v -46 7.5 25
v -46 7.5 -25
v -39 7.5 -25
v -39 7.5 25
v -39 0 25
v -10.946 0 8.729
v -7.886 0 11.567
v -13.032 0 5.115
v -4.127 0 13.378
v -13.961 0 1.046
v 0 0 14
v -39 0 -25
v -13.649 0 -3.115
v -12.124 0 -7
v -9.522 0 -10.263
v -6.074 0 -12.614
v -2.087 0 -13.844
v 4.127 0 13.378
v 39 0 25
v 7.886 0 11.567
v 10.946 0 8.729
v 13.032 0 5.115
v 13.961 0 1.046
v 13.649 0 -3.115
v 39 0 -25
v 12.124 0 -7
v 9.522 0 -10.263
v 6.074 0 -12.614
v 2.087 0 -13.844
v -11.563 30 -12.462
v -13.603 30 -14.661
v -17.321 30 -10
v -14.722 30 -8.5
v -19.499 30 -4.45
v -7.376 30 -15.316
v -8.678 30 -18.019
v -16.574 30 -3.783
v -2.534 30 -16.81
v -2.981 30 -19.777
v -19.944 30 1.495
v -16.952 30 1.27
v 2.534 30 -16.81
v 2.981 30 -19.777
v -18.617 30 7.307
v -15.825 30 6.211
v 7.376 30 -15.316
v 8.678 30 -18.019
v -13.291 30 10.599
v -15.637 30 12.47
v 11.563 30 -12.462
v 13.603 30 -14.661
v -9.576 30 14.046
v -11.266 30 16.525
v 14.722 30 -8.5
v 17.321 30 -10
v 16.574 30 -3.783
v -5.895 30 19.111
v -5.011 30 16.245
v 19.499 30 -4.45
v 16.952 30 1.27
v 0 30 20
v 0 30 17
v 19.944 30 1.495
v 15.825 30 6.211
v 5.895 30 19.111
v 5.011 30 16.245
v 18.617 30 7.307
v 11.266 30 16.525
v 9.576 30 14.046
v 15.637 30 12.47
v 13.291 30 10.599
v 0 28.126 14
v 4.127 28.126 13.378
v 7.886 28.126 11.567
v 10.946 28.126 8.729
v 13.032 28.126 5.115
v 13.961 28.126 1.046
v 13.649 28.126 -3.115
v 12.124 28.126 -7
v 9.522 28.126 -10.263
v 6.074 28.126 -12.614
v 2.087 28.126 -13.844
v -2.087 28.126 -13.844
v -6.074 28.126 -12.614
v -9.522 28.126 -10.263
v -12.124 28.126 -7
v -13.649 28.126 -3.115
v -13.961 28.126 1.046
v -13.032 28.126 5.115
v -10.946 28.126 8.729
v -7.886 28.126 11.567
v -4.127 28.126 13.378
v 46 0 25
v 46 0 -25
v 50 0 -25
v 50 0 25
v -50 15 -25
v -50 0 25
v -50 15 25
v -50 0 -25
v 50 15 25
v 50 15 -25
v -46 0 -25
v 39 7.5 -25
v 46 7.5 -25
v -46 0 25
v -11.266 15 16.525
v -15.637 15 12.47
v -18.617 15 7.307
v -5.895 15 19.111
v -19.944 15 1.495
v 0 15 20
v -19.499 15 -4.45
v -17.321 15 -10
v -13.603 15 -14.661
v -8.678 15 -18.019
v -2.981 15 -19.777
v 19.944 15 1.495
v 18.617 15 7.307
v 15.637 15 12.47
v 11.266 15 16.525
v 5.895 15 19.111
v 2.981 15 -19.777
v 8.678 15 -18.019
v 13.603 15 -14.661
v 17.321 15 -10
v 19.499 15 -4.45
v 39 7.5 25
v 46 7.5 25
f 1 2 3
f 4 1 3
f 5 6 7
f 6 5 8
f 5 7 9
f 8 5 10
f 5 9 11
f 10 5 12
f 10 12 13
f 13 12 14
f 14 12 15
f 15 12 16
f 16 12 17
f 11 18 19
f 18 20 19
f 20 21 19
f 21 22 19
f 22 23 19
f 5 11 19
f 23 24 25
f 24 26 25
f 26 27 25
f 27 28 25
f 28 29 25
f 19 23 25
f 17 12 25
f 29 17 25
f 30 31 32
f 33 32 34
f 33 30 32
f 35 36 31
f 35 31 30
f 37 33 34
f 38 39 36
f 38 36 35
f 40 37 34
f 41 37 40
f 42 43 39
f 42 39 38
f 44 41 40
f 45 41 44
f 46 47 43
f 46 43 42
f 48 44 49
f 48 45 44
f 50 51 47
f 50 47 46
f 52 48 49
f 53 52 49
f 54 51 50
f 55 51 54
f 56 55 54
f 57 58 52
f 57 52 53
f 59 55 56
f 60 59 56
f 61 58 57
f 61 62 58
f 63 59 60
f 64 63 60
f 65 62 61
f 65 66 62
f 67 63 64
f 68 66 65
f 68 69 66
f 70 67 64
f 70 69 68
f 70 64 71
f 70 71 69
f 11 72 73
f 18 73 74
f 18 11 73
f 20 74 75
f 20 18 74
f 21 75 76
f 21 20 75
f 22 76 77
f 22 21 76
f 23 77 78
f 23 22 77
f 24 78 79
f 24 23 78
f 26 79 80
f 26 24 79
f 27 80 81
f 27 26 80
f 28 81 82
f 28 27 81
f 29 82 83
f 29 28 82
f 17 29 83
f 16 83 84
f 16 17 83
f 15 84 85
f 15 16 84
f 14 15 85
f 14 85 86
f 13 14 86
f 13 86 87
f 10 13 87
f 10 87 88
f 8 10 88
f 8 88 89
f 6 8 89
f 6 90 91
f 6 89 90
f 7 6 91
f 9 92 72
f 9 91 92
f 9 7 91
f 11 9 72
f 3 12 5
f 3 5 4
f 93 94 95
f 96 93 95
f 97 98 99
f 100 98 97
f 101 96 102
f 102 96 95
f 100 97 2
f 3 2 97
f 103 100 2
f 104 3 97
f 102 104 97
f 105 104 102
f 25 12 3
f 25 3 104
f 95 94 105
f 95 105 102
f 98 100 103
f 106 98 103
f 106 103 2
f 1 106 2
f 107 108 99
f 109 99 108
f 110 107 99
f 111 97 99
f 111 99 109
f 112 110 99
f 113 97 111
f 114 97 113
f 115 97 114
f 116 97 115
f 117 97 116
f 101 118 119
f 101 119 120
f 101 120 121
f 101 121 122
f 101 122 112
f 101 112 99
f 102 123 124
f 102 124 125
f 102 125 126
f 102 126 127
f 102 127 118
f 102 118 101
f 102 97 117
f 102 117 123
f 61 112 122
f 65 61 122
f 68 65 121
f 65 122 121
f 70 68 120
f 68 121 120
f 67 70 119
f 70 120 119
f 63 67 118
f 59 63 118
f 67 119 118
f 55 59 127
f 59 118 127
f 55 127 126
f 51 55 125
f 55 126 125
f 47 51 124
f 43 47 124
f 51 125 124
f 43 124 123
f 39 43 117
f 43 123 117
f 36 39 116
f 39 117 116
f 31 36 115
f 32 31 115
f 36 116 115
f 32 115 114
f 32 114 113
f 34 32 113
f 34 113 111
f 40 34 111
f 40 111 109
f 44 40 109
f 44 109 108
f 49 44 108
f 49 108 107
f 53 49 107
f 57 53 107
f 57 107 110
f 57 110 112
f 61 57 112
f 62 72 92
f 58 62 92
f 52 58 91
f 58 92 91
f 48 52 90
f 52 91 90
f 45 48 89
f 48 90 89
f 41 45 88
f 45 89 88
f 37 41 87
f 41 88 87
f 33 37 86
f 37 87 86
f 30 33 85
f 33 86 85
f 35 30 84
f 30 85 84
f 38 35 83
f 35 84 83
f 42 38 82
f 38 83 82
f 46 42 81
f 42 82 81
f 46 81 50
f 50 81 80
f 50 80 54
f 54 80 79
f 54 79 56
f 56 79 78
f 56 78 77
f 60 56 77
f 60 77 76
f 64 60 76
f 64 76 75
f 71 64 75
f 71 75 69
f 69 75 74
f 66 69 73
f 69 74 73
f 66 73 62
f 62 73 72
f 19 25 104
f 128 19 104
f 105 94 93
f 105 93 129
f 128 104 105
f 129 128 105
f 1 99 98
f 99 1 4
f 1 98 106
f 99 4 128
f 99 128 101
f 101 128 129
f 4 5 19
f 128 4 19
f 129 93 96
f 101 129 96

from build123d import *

# Parameters (mm, degrees)
SKETCH1_R               = 20
SKETCH1_R_2             = 14
BOSS_EXTRUDE1_DEPTH     = 30
SKETCH3_W               = 17
SKETCH3_H               = 4.747307011
SKETCH4_W               = 100
SKETCH4_H               = 50
SKETCH4_R               = 14
BOSS_EXTRUDE2_DEPTH     = 15
CUT_EXTRUDE2_DEPTH      = 64.442887702
CUT_EXTRUDE2_DEPTH_BACK = 64.442887702
SKETCH5_W               = 7
SKETCH5_H               = 15


with BuildPart() as part:
    # Sketch1 → Boss-Extrude1 (new body)
    with BuildSketch(Plane(origin=(0, 0, 0), x_dir=(1, 0, 0), z_dir=(0, 1, 0))):
        with Locations(Location((0, 0, 0), (0, 0, 270))):
            Circle(SKETCH1_R)
        with Locations(Location((0, 0, 0), (0, 0, 270))):
            Circle(SKETCH1_R_2, mode=Mode.SUBTRACT)
    extrude(amount=BOSS_EXTRUDE1_DEPTH)

    # Sketch3 → Cut-Revolve2 (revolve, cut)
    with BuildSketch(Plane.XY, mode=Mode.PRIVATE) as cut_revolve2_sk:
        Polygon((-17, 30), (-0.03686902, 19.405086722), (0, 30), align=None)
        with Locations((-8.5, 32.373653506)):
            Rectangle(SKETCH3_W, SKETCH3_H)
    revolve(cut_revolve2_sk.sketch.rotate(Axis((0, 34.747307011, 0), (0, -1, 0)), 270), axis=Axis((0, 34.747307011, 0), (0, -1, 0)), mode=Mode.SUBTRACT)

    # Sketch4 → Boss-Extrude2 (add)
    with BuildSketch(Plane(origin=(0, 0, 0), x_dir=(1, 0, 0), z_dir=(0, 1, 0))):
        Rectangle(SKETCH4_W, SKETCH4_H)
        with Locations(Location((0, 0, 0), (0, 0, 270))):
            Circle(SKETCH4_R, mode=Mode.SUBTRACT)
    extrude(amount=BOSS_EXTRUDE2_DEPTH)

    # Sketch5 → Cut-Extrude2 (cut, two sides: drawn at the far end of the back side and taken through both)
    with BuildSketch(Plane.XY.offset(-CUT_EXTRUDE2_DEPTH_BACK)):
        with Locations((-42.5, 0)):
            Rectangle(SKETCH5_W, SKETCH5_H)
        with Locations((42.5, 0)):
            Rectangle(SKETCH5_W, SKETCH5_H)
    extrude(amount=CUT_EXTRUDE2_DEPTH + CUT_EXTRUDE2_DEPTH_BACK, mode=Mode.SUBTRACT)


solid = part.part
